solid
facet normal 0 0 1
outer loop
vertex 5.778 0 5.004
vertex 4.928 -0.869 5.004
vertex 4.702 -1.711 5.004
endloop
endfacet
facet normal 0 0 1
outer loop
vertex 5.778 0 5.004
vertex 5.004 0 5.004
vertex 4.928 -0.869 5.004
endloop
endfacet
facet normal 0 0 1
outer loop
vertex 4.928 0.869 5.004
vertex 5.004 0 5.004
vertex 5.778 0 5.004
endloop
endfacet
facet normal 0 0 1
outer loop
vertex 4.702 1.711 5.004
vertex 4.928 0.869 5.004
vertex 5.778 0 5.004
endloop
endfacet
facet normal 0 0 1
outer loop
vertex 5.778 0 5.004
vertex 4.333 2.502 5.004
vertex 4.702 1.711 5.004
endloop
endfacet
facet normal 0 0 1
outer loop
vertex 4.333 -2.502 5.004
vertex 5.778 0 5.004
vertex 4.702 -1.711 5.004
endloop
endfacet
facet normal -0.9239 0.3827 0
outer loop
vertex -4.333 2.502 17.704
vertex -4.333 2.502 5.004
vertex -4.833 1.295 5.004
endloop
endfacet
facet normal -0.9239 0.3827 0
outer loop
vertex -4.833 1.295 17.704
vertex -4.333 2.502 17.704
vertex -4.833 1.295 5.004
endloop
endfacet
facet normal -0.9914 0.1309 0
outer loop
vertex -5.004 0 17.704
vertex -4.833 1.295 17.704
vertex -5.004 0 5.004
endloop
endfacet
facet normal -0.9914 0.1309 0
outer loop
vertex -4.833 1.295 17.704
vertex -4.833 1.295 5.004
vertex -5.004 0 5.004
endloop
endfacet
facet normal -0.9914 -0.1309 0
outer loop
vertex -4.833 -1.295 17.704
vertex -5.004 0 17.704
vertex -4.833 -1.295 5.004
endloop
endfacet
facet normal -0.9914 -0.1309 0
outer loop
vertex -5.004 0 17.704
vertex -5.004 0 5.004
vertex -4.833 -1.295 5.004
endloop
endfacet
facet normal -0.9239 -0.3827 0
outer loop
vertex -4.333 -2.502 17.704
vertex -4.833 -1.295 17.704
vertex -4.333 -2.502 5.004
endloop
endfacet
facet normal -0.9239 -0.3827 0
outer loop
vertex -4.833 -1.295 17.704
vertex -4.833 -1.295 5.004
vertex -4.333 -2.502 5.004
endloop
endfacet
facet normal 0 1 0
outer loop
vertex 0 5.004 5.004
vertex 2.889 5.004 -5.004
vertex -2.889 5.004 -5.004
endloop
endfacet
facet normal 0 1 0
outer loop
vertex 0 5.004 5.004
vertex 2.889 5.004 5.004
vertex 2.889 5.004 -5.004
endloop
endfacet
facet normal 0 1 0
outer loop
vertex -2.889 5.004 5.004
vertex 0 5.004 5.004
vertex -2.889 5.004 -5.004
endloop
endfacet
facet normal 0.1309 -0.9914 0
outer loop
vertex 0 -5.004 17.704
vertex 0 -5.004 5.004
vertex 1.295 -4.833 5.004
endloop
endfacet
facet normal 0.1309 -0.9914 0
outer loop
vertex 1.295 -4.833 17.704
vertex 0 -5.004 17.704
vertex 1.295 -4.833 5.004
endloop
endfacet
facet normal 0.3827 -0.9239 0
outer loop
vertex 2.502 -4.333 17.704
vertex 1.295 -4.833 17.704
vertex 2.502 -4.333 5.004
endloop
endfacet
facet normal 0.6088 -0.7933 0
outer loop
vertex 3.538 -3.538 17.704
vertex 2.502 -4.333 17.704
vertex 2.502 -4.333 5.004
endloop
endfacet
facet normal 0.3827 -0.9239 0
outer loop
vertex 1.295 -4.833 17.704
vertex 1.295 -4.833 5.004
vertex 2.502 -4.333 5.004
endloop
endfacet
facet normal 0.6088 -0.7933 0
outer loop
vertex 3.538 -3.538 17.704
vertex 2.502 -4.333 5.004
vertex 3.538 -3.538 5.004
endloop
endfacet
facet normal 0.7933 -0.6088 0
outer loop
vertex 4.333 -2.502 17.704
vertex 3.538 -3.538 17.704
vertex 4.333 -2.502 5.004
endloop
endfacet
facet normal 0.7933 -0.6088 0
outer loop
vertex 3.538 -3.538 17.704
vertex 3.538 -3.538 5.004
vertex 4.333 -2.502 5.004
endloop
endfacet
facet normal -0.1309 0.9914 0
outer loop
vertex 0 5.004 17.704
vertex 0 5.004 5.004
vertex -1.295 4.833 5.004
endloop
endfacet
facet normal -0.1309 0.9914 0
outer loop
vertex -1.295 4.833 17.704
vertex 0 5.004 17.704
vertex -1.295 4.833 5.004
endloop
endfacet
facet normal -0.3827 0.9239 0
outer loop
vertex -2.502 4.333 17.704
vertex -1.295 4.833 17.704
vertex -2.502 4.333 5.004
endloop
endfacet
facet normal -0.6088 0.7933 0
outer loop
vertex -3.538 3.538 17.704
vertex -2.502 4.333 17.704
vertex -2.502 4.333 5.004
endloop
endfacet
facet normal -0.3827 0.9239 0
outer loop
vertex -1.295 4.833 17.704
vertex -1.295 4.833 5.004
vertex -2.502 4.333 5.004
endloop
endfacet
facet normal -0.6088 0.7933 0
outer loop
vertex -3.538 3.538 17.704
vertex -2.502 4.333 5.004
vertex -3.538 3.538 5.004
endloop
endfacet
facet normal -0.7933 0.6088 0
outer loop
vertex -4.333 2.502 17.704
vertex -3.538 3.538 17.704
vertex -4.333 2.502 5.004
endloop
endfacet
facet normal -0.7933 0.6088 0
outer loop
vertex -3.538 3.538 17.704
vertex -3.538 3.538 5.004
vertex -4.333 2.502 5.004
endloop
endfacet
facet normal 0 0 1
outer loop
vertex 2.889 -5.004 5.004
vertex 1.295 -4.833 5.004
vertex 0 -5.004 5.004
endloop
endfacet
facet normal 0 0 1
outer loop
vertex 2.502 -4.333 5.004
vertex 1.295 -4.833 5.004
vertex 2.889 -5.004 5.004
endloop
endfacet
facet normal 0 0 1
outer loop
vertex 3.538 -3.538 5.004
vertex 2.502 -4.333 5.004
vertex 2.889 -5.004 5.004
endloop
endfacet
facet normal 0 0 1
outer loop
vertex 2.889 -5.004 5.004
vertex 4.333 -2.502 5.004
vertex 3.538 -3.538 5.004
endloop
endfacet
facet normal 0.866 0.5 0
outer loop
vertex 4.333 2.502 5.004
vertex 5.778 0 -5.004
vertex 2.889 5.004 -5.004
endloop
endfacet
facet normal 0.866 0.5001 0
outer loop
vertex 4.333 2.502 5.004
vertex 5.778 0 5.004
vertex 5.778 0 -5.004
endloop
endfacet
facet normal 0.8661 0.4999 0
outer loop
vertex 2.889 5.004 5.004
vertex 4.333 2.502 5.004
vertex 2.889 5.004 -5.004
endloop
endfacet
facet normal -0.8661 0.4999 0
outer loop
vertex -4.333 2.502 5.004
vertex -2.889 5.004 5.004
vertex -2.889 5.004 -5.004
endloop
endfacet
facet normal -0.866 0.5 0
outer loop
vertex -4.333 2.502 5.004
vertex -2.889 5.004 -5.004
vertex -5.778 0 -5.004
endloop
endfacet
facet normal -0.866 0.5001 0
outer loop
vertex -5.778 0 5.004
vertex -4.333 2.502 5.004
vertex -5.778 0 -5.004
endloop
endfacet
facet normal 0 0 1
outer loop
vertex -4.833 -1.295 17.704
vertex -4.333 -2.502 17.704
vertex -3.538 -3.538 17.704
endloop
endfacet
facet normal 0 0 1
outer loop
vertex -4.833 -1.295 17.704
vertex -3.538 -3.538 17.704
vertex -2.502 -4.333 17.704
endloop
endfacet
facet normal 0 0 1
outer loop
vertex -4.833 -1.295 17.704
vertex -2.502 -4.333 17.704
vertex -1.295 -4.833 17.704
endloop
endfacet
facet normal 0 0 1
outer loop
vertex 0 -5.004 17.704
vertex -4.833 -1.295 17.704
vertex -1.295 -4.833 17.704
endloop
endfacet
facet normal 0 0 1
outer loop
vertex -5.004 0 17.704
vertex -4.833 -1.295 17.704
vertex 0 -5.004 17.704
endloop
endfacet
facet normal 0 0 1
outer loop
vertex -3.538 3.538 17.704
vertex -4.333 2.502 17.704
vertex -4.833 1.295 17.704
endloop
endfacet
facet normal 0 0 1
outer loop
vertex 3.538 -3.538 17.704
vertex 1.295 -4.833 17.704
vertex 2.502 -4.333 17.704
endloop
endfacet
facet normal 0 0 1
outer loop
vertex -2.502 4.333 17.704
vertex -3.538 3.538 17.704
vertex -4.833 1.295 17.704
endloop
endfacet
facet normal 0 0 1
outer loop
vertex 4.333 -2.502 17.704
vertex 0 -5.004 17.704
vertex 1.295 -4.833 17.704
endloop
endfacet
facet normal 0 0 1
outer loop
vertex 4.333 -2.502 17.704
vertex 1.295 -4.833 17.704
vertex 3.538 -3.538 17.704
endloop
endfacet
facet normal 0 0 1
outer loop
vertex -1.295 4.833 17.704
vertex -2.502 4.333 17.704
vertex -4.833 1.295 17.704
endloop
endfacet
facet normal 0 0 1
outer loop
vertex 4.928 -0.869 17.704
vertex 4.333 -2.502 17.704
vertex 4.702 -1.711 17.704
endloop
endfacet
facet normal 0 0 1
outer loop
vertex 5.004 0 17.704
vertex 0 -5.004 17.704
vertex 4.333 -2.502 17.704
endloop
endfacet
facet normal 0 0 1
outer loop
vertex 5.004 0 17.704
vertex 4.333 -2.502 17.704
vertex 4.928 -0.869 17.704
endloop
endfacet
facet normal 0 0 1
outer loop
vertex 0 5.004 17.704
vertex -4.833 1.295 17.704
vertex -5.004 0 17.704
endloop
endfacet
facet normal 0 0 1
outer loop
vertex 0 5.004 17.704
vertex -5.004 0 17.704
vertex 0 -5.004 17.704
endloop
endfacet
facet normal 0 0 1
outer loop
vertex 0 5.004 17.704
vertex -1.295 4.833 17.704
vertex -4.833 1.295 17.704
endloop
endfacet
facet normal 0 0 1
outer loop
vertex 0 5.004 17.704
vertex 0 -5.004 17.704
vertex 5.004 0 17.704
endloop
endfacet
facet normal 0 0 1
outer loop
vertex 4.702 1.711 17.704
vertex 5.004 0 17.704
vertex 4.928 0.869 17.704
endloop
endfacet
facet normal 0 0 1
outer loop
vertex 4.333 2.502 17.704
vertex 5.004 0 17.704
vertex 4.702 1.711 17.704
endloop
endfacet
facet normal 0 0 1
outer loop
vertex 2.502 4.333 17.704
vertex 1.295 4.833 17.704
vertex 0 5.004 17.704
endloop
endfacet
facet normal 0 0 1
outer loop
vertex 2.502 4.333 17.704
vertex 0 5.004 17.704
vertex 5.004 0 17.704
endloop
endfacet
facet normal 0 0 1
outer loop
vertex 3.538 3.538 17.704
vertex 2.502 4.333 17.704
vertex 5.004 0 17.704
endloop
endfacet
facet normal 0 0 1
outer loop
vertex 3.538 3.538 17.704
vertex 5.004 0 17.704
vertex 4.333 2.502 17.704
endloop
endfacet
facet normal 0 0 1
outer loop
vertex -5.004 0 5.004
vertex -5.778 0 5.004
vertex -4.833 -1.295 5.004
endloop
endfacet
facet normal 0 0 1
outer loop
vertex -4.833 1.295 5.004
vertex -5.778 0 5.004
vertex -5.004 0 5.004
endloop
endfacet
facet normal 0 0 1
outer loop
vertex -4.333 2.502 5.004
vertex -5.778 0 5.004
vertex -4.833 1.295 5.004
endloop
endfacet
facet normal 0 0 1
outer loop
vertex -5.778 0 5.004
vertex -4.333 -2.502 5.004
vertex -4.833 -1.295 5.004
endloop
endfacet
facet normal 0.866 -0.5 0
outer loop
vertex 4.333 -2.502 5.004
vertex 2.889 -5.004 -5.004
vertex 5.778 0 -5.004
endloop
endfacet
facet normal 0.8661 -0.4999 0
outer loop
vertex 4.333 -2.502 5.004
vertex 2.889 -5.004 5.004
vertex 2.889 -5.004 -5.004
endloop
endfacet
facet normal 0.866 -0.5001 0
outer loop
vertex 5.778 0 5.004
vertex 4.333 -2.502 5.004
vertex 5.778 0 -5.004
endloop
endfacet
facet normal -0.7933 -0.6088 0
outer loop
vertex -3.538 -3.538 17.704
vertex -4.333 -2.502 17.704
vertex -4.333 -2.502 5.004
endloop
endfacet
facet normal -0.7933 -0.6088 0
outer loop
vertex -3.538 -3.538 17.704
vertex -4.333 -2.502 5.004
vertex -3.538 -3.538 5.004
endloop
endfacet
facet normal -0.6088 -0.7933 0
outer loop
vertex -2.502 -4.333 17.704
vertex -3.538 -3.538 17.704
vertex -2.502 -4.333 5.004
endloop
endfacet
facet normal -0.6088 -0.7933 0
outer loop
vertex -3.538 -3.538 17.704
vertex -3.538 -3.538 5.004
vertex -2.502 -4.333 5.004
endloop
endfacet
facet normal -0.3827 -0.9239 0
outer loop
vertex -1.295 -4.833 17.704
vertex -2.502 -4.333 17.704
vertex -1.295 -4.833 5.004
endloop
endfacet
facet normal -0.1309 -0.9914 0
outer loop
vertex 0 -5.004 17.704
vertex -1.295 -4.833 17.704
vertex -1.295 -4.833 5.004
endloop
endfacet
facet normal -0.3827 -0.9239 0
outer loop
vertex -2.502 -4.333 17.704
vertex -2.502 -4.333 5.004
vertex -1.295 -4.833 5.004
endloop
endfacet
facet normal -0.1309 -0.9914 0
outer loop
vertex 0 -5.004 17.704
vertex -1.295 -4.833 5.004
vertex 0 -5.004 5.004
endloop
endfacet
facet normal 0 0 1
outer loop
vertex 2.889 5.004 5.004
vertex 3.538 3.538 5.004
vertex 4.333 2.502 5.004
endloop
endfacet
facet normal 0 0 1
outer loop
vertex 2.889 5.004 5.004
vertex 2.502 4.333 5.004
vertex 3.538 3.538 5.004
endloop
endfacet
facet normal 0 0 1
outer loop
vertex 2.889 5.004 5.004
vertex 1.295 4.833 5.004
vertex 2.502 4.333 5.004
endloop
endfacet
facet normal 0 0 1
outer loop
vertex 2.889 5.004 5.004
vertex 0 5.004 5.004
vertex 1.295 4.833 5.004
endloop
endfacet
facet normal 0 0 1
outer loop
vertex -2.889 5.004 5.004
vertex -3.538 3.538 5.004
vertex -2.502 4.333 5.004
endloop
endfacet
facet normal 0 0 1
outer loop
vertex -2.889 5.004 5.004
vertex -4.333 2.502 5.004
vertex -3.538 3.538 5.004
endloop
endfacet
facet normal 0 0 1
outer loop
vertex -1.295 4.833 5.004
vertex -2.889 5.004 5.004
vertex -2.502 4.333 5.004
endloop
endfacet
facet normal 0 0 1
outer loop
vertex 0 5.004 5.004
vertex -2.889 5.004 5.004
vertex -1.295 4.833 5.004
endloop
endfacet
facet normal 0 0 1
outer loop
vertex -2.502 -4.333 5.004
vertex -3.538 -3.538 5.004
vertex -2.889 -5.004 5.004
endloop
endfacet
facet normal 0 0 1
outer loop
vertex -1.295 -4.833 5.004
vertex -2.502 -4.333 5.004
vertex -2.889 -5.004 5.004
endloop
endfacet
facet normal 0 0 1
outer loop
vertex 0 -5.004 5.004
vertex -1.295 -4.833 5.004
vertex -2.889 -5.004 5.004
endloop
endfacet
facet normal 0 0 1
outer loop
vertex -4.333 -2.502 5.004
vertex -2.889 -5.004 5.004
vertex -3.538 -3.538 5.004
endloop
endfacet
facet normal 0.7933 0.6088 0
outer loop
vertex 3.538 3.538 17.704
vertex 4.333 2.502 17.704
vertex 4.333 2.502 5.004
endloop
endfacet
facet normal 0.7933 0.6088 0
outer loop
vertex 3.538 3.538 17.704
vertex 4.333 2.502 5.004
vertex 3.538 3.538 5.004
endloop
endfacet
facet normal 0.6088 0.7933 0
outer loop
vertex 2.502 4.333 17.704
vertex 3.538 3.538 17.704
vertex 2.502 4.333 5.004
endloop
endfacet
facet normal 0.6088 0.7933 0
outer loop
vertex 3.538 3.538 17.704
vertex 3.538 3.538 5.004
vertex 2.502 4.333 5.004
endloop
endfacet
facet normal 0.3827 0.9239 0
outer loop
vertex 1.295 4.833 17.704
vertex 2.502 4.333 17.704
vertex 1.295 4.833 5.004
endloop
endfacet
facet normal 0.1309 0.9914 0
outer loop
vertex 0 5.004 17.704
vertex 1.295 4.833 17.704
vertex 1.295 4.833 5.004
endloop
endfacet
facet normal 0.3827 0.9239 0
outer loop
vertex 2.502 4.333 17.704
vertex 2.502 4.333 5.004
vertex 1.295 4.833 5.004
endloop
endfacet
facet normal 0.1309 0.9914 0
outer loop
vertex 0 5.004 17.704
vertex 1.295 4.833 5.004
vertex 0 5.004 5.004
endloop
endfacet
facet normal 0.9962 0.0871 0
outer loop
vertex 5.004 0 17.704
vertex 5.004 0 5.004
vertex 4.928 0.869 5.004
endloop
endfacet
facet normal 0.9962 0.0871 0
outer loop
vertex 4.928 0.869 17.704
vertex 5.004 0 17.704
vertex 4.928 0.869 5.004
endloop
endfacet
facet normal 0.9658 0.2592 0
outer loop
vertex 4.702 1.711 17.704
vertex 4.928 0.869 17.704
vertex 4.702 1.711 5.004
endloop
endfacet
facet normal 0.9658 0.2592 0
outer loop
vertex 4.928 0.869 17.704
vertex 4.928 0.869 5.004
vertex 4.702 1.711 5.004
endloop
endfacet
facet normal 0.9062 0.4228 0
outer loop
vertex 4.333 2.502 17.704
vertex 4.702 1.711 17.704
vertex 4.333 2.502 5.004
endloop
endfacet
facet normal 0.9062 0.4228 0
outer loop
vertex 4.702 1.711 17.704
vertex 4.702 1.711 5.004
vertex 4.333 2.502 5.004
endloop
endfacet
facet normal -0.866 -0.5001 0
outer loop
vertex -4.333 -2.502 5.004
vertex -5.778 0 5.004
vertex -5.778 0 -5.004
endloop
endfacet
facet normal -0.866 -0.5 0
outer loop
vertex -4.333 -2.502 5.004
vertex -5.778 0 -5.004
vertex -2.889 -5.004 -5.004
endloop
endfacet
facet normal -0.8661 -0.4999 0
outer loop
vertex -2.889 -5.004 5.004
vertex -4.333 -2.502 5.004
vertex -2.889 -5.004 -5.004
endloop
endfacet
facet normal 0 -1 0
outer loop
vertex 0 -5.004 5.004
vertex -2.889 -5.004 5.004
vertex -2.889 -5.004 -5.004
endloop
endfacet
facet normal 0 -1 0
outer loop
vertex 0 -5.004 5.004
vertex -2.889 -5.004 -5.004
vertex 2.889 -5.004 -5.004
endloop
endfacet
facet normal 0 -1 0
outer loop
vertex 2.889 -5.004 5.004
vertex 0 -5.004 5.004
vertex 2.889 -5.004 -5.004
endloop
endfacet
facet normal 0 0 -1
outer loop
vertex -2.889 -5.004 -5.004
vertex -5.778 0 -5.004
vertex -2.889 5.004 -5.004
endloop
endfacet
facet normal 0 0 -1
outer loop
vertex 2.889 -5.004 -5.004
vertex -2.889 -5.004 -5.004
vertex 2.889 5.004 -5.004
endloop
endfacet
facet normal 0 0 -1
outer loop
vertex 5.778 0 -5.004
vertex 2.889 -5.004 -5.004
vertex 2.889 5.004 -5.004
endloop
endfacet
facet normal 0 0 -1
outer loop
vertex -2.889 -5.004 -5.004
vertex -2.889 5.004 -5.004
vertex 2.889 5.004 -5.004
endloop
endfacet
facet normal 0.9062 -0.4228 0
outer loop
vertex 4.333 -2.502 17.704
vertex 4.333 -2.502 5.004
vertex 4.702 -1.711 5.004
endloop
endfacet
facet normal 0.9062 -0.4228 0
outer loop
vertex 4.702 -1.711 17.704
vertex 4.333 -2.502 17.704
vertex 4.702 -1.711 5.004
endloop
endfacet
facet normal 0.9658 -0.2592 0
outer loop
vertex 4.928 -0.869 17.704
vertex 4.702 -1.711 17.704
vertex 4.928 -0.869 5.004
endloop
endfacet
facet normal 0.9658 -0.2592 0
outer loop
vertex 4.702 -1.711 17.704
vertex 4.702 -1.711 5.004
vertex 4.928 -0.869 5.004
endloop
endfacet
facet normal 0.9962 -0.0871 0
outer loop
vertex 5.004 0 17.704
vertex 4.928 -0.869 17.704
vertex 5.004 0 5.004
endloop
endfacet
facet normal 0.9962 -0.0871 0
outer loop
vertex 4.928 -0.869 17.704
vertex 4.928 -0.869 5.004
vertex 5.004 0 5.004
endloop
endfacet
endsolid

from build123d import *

# Parameters (mm, degrees)
F1_DEPTH = 5.0038
F3_DEPTH = 12.7


with BuildPart() as f1:
    # F0 (on Top) → F1 (new body, symmetric)
    with BuildSketch(Plane.XY):
        Polygon((2.888945, 5.0038), (-2.888945, 5.0038), (-5.777891, 0), (-2.888945, -5.0038), (2.888945, -5.0038), (5.777891, 0), align=None)
    extrude(amount=F1_DEPTH, both=True)

    # F2 (on face) → F3 (join)
    with BuildSketch(Plane.XY.offset(5.0038)):
        with BuildLine():
            ThreePointArc((4.333418, -2.5019), (4.8333, -1.295079), (5.0038, 0))
            ThreePointArc((5.0038, 0), (4.8333, 1.295079), (4.333418, 2.5019))
            ThreePointArc((4.333418, 2.5019), (2.5019, 4.333418), (0, 5.0038))
            ThreePointArc((0, 5.0038), (-2.5019, 4.333418), (-4.333418, 2.5019))
            ThreePointArc((-4.333418, 2.5019), (-5.0038, 0), (-4.333418, -2.5019))
            ThreePointArc((-4.333418, -2.5019), (-2.5019, -4.333418), (0, -5.0038))
            ThreePointArc((0, -5.0038), (2.5019, -4.333418), (4.333418, -2.5019))
        make_face()
    extrude(amount=F3_DEPTH)


solid = f1.part
